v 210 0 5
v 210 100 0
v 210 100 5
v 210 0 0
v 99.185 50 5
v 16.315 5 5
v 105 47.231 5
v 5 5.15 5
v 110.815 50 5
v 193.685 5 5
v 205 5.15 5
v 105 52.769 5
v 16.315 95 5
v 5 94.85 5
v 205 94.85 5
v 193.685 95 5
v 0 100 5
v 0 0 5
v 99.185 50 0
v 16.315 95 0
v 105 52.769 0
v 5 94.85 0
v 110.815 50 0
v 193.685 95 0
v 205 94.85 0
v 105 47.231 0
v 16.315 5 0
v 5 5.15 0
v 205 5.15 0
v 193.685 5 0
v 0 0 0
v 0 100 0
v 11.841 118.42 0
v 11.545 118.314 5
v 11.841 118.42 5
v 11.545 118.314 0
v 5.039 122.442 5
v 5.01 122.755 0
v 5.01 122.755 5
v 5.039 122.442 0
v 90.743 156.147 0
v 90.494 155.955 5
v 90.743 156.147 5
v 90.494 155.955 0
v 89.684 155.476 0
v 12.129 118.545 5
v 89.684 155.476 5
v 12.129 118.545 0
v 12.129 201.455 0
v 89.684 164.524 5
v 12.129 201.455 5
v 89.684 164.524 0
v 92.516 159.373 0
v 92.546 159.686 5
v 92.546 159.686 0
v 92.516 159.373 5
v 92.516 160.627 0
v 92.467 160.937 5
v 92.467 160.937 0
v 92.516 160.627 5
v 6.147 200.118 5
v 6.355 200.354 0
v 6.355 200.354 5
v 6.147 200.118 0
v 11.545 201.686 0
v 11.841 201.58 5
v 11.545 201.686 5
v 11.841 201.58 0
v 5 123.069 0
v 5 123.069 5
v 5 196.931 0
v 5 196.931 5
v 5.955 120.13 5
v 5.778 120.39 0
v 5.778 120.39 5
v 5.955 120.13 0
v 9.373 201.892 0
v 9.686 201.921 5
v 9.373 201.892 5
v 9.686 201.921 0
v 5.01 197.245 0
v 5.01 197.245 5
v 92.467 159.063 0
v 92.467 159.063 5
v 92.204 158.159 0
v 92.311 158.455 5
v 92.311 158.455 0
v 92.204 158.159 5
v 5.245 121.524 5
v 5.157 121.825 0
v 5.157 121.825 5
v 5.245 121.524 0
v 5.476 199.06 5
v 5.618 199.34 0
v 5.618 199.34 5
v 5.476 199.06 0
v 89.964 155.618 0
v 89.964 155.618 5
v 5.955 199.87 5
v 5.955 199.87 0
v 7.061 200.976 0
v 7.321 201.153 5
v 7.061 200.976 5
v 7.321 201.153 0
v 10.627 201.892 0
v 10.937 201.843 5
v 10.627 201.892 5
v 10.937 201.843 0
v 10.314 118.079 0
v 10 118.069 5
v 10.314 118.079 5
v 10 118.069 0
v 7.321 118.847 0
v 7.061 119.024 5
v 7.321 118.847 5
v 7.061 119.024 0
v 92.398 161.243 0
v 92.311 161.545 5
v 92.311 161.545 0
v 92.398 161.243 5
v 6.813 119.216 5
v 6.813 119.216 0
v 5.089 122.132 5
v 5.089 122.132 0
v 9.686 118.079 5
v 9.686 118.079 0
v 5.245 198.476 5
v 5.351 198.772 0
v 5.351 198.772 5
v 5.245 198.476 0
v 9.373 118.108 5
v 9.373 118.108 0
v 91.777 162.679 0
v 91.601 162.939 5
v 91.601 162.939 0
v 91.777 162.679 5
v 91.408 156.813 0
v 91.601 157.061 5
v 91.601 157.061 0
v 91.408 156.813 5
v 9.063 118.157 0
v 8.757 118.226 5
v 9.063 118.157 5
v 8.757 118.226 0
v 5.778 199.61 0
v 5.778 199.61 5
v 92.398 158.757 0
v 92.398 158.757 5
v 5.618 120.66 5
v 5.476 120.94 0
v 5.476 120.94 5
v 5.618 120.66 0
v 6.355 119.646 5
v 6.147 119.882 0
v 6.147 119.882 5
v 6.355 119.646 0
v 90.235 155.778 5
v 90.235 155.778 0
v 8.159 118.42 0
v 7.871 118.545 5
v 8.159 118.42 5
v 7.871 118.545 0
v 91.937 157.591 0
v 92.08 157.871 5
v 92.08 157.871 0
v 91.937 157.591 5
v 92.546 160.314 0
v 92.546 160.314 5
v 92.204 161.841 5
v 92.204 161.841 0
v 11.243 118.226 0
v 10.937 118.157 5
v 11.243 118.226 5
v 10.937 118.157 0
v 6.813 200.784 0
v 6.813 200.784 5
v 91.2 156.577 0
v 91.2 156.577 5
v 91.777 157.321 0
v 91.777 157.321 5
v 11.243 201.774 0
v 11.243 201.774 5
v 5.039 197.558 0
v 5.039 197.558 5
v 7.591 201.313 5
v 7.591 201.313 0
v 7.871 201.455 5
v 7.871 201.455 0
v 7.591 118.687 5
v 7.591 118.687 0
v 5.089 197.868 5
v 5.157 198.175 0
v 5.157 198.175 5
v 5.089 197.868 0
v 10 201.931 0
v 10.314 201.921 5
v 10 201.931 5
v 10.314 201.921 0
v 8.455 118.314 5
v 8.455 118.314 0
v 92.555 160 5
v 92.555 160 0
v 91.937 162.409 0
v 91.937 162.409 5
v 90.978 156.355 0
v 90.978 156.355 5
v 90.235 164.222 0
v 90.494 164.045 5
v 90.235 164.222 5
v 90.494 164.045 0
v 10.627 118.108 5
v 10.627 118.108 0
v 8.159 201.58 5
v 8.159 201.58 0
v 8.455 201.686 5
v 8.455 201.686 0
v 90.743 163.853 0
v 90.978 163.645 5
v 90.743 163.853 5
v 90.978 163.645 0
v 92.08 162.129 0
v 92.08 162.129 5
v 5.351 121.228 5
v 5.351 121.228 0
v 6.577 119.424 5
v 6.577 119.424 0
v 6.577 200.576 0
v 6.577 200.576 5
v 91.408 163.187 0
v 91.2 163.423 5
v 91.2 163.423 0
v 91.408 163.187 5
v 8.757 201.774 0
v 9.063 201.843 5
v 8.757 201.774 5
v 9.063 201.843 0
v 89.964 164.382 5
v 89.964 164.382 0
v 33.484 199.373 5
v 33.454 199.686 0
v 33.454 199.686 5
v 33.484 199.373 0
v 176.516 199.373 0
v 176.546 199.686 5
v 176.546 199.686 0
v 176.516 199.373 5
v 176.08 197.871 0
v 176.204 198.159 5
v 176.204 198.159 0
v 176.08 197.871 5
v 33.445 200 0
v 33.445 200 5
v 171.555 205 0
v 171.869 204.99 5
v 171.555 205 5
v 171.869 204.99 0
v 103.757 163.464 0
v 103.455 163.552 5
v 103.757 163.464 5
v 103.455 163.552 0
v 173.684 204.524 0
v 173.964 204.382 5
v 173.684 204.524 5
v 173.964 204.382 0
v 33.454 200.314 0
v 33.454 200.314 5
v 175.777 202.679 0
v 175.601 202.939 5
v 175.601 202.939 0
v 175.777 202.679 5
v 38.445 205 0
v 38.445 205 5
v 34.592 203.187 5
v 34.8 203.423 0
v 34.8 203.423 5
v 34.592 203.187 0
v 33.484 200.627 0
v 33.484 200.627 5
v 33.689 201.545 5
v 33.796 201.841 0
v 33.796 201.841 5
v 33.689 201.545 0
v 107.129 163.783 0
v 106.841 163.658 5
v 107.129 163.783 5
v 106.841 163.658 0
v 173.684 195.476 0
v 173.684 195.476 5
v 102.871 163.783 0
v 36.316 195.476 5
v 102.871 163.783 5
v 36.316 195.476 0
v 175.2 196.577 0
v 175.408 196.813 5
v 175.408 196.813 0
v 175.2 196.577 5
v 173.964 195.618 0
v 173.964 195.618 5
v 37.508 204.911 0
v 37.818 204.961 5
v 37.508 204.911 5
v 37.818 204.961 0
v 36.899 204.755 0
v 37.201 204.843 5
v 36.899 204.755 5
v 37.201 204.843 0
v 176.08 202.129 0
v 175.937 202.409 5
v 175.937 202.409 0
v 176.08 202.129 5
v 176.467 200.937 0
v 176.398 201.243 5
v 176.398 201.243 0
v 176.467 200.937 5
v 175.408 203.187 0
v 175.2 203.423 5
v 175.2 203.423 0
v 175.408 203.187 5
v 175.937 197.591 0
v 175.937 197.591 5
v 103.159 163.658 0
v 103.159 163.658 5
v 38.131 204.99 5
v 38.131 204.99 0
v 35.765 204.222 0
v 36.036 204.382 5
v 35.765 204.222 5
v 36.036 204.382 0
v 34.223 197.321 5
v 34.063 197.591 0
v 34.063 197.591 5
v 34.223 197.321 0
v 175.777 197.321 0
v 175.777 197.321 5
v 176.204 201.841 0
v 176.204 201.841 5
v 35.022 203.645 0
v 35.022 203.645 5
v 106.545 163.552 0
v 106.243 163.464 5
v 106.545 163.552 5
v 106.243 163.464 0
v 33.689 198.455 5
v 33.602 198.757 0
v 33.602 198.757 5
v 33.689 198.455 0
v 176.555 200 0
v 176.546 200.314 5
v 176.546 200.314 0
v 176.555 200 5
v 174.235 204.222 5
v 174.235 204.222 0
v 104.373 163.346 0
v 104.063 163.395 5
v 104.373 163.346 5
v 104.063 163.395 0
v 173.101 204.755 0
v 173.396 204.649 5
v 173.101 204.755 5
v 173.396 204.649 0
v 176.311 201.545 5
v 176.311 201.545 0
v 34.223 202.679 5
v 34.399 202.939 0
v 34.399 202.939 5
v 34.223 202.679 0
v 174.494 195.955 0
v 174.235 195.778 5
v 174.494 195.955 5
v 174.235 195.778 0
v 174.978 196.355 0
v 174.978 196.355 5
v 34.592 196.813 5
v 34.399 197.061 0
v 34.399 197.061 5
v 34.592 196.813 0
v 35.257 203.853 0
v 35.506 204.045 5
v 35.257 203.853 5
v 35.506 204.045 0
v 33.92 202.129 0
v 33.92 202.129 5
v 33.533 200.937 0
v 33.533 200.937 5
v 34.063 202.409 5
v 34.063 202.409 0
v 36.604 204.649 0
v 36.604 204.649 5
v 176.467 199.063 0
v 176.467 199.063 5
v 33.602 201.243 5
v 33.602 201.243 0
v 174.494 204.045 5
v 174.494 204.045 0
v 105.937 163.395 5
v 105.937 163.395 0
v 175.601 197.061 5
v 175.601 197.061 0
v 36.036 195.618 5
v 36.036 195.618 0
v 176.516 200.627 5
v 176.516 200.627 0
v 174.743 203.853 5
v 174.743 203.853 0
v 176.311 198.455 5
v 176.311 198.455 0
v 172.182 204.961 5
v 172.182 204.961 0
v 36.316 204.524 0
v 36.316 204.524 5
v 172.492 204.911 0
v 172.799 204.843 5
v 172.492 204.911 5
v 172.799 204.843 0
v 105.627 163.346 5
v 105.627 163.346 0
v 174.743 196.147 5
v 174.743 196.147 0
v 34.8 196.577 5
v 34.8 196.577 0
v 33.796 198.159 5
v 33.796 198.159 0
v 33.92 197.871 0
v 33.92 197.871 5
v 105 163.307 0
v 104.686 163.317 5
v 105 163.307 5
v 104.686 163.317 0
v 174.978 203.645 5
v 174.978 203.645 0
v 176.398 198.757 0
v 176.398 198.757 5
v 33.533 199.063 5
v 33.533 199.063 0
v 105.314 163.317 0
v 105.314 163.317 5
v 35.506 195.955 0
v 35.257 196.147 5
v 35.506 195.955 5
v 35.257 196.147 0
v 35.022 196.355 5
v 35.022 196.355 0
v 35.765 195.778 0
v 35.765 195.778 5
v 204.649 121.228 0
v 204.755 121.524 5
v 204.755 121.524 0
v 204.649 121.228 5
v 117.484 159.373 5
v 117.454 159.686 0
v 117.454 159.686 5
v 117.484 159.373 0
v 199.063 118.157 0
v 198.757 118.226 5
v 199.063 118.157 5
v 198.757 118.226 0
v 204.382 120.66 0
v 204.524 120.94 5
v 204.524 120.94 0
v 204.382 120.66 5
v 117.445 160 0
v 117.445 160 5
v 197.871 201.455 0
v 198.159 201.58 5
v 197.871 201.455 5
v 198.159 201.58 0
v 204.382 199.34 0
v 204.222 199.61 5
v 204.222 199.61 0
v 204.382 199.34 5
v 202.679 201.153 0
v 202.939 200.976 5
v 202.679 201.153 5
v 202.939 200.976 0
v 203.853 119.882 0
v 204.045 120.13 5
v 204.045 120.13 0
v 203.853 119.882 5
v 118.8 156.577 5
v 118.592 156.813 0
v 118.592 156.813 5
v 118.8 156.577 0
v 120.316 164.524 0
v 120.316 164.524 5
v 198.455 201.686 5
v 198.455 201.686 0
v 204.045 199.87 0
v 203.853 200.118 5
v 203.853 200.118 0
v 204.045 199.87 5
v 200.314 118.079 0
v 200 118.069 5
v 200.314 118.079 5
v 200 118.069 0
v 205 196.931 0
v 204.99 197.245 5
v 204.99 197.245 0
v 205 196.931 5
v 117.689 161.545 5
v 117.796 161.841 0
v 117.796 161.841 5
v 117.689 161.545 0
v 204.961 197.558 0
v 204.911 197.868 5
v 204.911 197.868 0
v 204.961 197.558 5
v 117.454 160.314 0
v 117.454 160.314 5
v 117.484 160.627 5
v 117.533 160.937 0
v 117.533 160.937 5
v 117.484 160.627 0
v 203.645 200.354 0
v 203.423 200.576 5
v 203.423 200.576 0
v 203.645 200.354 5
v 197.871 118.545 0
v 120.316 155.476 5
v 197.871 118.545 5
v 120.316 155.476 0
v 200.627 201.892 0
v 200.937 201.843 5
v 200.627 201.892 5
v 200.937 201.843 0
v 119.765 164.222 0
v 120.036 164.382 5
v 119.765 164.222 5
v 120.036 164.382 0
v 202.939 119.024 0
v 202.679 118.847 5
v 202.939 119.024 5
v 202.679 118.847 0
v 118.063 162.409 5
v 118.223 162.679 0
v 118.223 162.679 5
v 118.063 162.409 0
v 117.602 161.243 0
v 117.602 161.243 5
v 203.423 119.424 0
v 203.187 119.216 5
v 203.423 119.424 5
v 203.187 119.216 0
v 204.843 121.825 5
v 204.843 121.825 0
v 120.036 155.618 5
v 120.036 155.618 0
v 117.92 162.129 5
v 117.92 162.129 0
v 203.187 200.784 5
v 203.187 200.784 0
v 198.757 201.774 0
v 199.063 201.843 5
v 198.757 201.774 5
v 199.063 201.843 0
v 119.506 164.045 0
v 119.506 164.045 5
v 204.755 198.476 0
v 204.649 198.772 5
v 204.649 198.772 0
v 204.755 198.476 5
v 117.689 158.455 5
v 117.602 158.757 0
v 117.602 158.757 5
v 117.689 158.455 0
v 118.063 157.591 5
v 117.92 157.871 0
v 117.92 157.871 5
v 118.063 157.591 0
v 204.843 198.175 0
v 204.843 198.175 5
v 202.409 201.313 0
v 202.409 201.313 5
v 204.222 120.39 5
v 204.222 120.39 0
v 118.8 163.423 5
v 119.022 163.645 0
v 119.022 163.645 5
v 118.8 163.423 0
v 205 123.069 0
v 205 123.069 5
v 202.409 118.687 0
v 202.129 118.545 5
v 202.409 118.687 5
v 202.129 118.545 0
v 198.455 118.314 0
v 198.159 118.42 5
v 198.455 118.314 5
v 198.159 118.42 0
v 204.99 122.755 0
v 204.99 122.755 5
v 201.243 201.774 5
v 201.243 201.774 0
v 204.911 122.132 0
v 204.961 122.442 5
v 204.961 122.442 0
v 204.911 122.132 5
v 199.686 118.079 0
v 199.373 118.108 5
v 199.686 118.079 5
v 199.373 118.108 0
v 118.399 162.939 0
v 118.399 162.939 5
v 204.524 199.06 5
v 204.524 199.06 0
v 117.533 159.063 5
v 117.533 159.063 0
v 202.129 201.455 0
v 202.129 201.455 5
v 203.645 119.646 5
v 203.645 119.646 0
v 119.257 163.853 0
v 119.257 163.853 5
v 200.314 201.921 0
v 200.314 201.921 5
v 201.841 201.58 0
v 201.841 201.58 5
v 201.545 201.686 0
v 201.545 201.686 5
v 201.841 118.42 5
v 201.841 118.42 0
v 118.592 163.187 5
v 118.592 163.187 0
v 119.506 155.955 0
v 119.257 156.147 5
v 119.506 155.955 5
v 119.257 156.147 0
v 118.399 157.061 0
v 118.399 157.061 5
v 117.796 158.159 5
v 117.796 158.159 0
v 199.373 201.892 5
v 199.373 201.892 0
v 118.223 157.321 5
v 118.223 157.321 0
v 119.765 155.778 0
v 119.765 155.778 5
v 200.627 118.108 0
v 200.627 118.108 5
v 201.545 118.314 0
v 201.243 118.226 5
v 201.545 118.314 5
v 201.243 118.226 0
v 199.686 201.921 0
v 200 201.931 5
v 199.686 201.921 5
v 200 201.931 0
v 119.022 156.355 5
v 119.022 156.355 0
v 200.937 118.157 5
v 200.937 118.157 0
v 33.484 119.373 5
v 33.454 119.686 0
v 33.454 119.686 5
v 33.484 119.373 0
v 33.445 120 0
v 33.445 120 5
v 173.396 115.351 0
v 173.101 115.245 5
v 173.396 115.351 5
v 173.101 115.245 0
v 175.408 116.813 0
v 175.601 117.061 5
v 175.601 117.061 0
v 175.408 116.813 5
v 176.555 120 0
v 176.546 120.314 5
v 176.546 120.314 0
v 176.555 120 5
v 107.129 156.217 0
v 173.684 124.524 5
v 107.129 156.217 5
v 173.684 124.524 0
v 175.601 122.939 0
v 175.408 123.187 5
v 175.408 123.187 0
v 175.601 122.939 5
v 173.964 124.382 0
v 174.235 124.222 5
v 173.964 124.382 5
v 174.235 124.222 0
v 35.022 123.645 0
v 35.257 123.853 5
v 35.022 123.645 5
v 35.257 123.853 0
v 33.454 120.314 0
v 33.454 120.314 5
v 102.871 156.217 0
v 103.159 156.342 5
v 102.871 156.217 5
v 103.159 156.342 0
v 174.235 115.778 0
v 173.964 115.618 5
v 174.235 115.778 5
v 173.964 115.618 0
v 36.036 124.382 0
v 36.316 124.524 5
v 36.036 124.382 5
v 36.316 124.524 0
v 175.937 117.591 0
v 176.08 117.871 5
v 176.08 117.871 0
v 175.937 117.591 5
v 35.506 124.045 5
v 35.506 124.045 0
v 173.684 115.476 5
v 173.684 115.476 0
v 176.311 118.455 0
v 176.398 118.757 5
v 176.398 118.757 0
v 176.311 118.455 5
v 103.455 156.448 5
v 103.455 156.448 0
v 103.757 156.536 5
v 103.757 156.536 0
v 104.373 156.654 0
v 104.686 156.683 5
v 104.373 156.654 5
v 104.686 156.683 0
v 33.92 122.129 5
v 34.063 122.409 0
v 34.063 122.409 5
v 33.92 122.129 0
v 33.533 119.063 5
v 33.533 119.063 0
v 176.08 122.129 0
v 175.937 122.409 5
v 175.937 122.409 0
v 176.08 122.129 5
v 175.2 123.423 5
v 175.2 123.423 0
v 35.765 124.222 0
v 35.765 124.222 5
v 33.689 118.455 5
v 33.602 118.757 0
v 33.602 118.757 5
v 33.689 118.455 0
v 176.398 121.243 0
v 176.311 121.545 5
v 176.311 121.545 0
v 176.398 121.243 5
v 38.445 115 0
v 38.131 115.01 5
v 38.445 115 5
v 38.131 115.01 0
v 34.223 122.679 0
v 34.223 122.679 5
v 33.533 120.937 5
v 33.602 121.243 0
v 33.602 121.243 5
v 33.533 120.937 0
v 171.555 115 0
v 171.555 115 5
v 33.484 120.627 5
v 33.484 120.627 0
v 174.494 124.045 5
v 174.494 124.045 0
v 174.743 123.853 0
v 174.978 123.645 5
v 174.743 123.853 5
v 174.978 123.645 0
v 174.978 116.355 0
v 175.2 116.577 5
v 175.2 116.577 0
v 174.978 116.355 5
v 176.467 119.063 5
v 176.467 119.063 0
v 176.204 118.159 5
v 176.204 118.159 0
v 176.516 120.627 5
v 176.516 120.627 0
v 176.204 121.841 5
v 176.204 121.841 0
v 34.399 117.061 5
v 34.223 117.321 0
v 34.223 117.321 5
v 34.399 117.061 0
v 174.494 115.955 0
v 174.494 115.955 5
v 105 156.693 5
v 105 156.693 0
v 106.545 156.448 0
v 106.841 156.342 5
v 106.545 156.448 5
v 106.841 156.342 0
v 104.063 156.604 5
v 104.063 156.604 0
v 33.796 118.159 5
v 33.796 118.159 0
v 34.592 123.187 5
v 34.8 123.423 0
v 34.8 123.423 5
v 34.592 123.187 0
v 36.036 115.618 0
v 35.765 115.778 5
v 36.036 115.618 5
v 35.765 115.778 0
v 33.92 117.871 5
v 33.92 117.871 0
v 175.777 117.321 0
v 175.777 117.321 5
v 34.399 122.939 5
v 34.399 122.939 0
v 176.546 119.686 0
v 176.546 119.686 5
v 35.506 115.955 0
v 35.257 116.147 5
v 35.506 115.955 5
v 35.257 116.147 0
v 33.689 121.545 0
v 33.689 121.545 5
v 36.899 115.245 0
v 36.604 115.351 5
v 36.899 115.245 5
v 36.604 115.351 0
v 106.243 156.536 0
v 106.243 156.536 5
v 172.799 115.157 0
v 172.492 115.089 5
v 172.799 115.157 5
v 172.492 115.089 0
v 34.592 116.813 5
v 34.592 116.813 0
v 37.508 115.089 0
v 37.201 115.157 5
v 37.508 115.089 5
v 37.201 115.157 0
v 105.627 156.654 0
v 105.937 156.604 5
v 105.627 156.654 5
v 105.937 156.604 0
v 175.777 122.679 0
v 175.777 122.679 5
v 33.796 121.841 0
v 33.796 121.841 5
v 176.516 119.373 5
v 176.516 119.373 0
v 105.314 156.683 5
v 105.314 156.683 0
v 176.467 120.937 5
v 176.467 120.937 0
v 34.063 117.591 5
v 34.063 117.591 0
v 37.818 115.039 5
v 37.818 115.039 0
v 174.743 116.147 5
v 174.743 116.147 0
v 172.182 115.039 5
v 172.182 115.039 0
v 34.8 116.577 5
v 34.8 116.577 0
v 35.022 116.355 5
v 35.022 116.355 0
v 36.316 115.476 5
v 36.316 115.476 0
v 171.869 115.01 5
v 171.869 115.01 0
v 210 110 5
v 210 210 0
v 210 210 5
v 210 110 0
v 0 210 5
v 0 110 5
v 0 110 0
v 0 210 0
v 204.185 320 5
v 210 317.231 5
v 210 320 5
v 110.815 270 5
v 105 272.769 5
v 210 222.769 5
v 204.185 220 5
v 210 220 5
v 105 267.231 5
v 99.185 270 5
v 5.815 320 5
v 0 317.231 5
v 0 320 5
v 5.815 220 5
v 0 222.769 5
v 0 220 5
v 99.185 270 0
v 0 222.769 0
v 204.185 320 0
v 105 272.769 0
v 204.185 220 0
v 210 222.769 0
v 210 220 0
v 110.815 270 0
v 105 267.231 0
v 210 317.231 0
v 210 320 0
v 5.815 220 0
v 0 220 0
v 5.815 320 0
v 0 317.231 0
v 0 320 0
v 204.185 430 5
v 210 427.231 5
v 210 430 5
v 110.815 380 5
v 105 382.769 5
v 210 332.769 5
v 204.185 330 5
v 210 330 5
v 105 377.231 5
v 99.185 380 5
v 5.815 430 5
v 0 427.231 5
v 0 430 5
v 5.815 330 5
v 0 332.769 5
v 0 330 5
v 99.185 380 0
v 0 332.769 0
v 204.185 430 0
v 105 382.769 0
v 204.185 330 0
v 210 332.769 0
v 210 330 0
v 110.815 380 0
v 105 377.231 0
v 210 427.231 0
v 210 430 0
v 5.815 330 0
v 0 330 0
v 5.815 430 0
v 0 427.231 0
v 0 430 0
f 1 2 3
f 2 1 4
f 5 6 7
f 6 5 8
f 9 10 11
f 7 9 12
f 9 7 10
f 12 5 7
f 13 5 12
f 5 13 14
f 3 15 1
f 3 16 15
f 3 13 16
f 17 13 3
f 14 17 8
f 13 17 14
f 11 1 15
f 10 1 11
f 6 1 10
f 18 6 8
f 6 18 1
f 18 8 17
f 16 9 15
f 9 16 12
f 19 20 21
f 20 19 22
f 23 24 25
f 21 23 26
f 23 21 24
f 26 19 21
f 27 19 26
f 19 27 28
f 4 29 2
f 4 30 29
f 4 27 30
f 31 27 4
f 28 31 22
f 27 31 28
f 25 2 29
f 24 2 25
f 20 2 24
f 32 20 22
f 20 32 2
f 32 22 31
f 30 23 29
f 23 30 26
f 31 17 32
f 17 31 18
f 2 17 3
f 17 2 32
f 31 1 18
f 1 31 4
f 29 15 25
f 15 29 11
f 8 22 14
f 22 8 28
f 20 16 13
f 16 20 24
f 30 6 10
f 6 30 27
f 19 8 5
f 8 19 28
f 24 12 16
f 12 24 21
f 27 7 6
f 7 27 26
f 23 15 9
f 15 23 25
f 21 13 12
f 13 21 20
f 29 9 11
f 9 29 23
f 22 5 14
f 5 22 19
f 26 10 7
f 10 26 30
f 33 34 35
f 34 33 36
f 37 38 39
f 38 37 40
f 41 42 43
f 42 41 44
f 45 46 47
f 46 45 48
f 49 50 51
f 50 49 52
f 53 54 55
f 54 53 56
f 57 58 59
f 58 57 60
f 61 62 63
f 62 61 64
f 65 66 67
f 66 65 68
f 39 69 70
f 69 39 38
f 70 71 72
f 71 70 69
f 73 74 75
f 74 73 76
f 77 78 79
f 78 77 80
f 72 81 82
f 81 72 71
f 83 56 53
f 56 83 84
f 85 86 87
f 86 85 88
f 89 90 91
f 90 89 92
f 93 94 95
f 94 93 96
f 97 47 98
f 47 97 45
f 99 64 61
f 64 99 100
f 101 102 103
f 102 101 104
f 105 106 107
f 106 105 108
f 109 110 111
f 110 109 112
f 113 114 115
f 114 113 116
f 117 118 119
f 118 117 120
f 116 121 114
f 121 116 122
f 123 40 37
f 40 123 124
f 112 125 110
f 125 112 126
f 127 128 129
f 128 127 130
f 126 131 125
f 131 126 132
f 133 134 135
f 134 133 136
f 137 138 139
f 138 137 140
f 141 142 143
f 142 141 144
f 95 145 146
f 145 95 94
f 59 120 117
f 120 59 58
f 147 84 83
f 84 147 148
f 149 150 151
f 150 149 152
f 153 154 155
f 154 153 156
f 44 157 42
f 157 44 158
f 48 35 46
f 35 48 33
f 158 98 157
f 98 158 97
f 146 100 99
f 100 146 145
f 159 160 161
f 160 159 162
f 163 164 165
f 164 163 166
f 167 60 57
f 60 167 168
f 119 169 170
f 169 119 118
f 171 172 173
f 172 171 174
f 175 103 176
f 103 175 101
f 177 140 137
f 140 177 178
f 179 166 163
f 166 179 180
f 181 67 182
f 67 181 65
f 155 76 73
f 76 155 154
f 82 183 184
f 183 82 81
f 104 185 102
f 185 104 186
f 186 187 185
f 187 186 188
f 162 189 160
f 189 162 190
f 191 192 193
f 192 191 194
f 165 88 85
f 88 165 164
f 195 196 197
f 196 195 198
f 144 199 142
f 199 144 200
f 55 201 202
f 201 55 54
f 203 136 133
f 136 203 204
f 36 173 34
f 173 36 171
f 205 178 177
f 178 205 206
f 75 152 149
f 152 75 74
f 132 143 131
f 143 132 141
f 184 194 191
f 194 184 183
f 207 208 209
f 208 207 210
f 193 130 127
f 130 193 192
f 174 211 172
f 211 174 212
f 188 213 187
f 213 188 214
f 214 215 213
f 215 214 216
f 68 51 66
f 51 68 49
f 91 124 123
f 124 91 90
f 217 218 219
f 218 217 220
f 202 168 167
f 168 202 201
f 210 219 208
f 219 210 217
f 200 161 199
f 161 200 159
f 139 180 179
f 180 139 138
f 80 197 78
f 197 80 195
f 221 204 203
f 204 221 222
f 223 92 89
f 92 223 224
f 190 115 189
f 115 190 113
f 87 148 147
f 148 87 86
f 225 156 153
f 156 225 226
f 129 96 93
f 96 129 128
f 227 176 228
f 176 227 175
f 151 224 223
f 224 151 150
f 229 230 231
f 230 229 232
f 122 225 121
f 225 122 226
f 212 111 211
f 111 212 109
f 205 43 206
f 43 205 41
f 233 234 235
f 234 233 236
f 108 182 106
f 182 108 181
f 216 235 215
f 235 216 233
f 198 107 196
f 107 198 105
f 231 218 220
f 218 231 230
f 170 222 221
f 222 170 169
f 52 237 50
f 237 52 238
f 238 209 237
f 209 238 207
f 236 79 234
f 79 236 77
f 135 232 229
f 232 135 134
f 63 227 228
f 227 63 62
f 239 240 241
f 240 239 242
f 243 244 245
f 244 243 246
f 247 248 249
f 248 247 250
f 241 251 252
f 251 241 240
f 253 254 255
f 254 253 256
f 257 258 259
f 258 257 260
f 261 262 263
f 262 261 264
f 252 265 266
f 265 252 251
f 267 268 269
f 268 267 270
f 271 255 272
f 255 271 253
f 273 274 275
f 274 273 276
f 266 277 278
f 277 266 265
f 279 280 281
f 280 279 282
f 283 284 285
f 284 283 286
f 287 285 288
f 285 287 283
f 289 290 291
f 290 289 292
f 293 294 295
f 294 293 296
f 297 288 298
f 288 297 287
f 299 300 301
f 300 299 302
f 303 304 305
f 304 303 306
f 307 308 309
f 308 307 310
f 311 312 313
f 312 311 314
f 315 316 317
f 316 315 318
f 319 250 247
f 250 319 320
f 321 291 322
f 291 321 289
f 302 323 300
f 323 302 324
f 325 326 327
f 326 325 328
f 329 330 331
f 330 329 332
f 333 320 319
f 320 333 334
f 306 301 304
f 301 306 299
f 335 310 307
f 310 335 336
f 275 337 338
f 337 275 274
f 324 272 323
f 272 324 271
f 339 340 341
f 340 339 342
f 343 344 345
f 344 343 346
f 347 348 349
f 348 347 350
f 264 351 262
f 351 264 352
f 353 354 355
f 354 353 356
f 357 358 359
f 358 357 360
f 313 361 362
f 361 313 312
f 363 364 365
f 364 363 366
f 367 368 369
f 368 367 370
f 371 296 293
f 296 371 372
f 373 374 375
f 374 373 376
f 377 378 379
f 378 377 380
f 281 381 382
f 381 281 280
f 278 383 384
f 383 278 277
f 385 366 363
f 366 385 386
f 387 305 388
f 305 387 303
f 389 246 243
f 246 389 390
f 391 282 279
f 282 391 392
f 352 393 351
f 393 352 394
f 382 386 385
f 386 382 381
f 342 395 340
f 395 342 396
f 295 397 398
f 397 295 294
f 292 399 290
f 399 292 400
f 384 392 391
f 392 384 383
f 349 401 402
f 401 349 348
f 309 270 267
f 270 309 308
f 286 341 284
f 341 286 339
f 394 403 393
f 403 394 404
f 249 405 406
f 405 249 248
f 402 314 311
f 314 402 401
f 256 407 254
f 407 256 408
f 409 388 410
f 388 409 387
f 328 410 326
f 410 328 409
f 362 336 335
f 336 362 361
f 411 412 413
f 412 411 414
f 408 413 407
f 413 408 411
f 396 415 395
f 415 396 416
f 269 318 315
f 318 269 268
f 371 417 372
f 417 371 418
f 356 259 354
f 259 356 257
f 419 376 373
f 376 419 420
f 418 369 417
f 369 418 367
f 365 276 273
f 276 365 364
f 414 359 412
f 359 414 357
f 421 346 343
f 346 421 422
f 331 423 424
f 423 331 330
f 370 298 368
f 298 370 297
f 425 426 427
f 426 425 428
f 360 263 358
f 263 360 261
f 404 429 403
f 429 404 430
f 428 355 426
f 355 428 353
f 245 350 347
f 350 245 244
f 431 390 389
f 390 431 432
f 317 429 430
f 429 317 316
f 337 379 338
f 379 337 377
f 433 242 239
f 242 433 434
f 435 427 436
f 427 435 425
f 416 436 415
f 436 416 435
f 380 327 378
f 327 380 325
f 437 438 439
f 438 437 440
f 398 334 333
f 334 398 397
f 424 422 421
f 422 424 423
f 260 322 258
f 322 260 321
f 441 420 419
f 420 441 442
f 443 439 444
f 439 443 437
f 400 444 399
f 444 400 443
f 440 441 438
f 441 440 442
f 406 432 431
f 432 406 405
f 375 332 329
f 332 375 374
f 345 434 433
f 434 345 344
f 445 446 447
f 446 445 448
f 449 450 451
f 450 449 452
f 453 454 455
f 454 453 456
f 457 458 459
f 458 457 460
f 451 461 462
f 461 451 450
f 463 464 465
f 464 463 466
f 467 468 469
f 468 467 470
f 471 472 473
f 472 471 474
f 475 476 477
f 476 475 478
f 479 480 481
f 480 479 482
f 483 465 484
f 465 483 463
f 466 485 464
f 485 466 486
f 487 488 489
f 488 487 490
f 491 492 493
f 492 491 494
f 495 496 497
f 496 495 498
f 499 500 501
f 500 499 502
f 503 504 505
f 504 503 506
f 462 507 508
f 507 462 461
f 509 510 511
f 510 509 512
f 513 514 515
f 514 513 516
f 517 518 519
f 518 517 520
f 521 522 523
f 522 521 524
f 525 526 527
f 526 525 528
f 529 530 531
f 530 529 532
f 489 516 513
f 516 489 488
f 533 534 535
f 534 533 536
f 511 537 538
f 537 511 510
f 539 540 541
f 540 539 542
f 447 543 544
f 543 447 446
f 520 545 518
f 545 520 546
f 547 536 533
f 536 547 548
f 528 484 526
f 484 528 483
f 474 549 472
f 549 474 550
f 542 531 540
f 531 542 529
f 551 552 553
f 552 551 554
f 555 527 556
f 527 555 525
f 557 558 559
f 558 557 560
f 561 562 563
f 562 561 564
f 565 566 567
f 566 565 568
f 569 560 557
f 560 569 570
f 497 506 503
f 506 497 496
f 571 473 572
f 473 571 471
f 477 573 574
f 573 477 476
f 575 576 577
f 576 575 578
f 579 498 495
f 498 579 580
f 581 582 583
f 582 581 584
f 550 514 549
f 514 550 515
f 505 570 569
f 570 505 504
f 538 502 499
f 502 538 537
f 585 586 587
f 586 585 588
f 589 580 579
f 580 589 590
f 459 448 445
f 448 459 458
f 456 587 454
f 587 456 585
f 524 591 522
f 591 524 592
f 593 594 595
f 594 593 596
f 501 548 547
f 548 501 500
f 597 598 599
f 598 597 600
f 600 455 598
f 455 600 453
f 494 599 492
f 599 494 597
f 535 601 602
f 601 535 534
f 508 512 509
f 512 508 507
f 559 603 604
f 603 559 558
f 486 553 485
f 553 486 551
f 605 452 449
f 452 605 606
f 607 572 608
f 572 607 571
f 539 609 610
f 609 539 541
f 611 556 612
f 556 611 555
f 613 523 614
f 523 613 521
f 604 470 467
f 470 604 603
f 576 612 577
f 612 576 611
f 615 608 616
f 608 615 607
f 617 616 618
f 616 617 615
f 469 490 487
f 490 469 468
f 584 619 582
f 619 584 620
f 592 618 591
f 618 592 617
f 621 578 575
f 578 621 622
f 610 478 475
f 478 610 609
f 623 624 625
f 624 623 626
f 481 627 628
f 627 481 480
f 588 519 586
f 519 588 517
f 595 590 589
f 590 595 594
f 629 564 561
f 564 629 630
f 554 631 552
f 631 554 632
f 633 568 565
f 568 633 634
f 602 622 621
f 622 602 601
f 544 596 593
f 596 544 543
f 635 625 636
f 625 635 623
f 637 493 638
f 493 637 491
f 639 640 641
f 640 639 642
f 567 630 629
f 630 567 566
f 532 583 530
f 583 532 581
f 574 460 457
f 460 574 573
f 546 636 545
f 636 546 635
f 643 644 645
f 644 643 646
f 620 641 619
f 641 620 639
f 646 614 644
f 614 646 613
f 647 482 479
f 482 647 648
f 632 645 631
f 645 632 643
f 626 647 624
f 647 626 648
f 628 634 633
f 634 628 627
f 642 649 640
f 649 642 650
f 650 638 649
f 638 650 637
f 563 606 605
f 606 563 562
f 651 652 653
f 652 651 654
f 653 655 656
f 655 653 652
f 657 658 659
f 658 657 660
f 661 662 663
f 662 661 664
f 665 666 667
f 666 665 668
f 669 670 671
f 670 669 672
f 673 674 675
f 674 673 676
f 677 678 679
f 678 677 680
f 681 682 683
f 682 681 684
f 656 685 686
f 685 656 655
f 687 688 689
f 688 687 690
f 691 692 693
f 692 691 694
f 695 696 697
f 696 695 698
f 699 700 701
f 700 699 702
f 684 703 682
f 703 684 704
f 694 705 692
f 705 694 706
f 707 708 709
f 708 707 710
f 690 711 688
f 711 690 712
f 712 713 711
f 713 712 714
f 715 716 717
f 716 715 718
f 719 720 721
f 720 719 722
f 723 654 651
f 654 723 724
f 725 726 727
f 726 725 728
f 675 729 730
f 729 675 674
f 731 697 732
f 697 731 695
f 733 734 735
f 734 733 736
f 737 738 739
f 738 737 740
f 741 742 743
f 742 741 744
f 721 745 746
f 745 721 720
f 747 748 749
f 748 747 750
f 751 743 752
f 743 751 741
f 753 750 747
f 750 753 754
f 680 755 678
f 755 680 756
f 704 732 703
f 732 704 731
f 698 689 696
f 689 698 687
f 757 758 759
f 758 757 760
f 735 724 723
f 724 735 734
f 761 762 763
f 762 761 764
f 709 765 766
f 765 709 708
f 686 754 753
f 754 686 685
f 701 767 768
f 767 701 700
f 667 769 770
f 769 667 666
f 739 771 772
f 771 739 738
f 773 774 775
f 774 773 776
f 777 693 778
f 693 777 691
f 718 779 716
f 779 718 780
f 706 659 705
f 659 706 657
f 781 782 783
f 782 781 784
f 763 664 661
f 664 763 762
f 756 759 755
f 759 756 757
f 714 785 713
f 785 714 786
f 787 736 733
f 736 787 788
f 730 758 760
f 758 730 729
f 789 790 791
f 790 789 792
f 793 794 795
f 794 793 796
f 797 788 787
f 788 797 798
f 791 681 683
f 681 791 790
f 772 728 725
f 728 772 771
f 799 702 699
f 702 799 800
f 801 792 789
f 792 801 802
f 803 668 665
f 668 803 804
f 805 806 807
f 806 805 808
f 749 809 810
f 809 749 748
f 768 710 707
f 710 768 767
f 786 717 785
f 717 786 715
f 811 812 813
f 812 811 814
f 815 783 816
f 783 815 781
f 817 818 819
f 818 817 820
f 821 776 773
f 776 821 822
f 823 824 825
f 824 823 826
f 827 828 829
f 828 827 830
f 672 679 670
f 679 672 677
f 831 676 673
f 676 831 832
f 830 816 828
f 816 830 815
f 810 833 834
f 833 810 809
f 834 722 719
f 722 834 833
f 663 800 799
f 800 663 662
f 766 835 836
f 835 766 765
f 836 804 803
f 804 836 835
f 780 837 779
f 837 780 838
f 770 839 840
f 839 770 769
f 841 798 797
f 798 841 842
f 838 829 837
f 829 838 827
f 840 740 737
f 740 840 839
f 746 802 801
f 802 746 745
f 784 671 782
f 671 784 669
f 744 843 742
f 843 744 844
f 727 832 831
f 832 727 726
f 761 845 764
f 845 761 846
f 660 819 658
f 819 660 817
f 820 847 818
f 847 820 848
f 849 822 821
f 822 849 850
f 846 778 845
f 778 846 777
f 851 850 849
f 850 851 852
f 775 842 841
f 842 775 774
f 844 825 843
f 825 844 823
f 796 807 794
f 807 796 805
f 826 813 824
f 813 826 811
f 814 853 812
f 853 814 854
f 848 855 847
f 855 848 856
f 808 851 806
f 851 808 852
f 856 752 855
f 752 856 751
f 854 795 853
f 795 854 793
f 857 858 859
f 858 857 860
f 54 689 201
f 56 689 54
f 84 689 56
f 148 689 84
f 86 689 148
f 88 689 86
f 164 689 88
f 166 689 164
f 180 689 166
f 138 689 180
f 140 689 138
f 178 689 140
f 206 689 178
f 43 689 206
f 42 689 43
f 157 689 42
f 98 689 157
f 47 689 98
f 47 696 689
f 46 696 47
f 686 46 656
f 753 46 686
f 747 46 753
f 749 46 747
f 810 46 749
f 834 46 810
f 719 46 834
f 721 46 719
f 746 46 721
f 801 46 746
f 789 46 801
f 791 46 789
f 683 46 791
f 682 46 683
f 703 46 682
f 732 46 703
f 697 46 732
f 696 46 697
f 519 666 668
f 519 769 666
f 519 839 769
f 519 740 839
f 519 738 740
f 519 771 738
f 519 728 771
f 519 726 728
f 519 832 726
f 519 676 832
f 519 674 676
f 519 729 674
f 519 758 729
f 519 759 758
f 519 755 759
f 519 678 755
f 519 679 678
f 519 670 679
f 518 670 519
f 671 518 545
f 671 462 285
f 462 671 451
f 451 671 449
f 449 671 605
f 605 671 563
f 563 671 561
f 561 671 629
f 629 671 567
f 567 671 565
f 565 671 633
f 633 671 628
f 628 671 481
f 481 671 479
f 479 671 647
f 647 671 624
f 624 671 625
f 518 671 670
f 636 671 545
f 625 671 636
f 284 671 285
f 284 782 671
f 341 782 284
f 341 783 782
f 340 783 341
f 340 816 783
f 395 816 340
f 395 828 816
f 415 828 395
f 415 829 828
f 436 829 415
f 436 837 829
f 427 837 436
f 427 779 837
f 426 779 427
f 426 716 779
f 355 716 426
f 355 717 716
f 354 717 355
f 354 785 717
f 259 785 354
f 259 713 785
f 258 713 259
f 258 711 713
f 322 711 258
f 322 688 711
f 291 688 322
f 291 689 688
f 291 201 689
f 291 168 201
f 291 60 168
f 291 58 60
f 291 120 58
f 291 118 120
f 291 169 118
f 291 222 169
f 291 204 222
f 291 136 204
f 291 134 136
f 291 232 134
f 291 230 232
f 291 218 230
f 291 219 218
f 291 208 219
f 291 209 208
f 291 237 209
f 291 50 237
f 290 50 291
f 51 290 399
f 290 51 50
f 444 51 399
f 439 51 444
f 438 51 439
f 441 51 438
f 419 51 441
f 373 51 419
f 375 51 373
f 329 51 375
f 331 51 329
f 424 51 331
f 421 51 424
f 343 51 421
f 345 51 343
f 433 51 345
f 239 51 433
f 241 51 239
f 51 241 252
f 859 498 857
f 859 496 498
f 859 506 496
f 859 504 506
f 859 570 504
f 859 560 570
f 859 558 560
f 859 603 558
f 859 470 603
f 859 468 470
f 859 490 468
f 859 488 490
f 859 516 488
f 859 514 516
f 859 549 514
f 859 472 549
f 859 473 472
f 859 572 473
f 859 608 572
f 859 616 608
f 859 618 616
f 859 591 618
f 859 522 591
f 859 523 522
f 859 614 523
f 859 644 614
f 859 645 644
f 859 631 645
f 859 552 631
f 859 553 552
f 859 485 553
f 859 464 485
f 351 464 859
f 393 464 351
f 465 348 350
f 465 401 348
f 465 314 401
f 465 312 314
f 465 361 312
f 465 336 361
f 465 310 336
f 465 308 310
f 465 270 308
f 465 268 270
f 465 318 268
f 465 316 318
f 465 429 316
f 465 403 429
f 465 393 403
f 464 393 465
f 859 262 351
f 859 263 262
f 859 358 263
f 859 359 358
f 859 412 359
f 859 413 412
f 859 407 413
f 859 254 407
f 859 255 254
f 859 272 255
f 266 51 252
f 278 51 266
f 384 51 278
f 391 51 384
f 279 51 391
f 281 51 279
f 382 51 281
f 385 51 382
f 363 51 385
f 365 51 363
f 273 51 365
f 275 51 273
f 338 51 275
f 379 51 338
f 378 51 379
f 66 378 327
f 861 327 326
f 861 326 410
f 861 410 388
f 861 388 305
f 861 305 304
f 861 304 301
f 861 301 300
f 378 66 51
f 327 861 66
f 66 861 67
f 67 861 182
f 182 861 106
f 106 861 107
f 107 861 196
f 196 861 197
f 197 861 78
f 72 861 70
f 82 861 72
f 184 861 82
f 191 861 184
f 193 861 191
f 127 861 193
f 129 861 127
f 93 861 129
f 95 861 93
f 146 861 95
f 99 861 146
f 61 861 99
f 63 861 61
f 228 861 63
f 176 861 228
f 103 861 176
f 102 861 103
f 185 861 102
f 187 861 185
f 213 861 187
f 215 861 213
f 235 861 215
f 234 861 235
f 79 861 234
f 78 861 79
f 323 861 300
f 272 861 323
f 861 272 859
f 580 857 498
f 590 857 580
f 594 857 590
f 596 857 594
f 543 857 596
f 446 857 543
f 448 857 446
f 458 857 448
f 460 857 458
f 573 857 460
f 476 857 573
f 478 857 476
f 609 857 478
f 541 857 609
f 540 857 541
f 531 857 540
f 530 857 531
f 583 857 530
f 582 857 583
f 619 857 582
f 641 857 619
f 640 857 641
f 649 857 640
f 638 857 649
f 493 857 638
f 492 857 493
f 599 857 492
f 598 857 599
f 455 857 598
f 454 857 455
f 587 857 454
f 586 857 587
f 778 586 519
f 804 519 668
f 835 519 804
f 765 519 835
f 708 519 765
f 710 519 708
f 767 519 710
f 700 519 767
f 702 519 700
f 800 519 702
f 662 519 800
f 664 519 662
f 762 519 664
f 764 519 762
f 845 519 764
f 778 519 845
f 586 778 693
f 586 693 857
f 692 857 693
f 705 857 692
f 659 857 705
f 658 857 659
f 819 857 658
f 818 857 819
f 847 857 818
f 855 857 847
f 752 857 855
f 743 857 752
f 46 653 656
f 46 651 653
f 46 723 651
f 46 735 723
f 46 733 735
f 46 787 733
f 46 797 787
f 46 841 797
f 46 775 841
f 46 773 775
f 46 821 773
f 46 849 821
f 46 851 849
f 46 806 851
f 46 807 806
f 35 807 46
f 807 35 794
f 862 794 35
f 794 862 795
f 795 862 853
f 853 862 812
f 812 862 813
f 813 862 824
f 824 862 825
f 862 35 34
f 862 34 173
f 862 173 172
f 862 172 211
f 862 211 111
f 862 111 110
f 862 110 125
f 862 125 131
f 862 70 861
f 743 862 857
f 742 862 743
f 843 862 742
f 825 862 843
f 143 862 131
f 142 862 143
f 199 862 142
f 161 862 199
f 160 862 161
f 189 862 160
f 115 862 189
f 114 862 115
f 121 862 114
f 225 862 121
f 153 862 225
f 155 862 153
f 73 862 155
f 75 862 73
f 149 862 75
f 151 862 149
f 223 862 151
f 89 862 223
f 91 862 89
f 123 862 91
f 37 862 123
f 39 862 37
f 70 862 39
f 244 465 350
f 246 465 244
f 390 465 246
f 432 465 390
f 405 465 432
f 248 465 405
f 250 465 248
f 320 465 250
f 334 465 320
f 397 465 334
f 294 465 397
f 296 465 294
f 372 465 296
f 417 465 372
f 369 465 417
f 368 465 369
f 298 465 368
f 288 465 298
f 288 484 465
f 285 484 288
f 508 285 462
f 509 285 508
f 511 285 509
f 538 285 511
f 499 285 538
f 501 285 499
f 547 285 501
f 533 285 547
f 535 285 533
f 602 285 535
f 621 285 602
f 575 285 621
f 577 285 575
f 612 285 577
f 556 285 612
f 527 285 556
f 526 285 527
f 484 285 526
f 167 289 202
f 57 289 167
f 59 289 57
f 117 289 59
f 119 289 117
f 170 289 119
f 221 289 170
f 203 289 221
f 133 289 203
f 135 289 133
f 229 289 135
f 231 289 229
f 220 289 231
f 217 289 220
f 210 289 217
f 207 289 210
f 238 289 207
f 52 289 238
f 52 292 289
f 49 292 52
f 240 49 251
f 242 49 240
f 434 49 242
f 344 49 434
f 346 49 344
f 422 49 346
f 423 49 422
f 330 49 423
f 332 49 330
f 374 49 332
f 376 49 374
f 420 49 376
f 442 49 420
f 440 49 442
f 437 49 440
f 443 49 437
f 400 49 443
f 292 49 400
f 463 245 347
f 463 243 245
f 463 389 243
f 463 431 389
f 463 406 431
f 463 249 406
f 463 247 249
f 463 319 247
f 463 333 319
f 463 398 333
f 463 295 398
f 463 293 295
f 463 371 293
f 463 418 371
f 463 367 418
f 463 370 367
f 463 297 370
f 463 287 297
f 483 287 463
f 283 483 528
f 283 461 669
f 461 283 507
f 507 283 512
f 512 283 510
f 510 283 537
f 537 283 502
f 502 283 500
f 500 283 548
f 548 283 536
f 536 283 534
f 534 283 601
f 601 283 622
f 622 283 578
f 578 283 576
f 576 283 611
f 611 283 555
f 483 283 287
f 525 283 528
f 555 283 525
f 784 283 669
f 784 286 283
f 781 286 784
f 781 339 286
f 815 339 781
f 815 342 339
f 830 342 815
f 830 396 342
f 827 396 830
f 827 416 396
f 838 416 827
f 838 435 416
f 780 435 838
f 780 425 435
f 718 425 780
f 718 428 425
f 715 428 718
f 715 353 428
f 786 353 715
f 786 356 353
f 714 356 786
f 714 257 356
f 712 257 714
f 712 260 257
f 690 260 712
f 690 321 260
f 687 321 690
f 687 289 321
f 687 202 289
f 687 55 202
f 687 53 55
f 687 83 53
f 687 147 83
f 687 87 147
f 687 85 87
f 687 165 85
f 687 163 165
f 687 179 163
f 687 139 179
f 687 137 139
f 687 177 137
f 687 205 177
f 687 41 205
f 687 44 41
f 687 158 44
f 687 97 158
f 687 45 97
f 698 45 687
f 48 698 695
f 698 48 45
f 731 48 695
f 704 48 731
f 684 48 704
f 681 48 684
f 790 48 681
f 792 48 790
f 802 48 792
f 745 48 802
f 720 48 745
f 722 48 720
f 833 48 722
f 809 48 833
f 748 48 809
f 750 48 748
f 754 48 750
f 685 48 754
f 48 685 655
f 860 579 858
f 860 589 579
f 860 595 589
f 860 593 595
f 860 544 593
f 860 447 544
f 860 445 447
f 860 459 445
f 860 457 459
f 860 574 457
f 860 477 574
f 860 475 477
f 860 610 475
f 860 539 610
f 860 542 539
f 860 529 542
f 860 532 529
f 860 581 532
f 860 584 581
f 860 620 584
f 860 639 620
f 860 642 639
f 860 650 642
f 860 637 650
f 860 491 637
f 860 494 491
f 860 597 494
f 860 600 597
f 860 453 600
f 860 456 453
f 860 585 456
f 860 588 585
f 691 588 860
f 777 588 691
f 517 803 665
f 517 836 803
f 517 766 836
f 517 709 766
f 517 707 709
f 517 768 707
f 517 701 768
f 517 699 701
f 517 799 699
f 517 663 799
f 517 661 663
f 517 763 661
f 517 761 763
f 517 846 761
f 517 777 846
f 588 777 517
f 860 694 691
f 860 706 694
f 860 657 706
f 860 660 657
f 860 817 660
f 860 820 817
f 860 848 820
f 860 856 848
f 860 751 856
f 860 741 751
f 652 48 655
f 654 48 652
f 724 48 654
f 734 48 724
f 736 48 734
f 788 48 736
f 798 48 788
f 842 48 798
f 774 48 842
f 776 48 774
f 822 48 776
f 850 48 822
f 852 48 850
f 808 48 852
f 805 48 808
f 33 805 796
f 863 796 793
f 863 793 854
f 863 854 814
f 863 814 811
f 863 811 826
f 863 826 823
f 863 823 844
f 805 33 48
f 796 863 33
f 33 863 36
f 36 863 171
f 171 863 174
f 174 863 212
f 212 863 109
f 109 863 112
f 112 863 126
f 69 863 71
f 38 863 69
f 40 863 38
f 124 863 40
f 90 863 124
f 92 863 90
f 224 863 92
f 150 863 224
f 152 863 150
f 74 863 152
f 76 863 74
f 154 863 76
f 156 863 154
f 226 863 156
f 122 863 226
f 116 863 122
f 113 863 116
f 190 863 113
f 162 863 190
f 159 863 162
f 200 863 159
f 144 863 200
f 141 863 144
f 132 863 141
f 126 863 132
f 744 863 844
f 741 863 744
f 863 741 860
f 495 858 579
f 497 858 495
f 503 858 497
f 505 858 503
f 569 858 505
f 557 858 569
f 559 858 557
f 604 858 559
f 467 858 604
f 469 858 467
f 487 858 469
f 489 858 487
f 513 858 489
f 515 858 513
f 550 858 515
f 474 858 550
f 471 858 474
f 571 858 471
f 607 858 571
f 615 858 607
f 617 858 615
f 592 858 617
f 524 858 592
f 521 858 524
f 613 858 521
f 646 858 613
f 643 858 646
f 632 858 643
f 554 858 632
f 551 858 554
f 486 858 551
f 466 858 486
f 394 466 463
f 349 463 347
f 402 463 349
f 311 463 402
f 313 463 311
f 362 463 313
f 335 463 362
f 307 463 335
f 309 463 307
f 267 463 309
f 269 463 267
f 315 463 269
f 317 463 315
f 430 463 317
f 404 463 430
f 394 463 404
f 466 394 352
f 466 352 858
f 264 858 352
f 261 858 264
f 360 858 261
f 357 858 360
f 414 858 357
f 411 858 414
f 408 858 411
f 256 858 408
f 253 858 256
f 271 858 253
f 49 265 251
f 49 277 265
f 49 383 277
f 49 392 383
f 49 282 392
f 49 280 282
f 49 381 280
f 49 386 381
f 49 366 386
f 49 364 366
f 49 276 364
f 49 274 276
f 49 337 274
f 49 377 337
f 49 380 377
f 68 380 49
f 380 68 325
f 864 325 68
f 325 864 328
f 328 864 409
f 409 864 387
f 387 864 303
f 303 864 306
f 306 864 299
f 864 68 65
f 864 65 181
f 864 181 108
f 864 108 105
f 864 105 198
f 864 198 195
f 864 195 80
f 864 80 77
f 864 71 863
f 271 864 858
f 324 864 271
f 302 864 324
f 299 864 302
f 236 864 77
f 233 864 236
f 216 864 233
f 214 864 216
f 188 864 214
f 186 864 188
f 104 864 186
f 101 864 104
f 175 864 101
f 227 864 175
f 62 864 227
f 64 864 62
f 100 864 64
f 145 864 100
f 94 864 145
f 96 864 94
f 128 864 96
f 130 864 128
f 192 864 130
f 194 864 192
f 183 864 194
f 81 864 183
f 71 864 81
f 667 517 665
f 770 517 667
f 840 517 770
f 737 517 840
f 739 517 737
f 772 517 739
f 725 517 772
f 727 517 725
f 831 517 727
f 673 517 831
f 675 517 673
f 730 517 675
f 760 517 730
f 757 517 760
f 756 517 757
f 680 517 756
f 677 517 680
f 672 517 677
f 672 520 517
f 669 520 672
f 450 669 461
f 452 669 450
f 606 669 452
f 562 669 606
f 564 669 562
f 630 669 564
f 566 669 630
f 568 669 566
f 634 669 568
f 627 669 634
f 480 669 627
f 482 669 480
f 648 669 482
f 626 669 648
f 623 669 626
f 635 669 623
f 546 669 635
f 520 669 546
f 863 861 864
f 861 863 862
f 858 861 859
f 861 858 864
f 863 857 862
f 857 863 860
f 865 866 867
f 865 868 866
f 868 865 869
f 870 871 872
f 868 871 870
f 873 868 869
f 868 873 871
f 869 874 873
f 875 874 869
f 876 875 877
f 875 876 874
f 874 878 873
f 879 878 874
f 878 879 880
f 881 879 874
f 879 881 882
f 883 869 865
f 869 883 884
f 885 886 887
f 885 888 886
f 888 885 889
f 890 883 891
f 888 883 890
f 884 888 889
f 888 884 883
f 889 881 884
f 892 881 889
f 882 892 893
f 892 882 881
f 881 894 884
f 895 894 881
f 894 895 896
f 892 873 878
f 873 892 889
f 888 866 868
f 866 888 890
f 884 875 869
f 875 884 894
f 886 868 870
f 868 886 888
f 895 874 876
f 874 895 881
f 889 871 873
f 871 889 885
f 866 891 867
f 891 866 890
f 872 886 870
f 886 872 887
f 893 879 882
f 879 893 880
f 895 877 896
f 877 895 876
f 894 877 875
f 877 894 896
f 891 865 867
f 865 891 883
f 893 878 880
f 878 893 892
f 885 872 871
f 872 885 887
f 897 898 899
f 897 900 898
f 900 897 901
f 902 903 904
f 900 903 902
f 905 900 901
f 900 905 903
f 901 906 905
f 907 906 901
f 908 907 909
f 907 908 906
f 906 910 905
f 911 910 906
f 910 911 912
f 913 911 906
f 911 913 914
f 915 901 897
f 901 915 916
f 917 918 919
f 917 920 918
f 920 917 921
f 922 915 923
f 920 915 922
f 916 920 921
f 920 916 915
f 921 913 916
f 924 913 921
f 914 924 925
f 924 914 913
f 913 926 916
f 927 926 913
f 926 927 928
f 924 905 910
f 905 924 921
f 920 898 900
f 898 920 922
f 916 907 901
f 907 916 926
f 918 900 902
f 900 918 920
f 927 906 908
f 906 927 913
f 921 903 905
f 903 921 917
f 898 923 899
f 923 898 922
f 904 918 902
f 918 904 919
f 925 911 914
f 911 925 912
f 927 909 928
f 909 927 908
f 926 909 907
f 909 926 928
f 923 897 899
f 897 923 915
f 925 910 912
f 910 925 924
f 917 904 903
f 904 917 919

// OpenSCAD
/*
    make reinforcement axis in a open frame.
*/

d=[210,100,5];
width = 5;
t=[0, d.y + 10, 0];

// standaard, geen afroding
translate(t * 0) reinforceX(d=d, width=width);
// afronding
translate(t * 1) reinforceX(d=d, width=width, radius = 5);
// xOnly, geen afronding
translate(t * 2) reinforceX(d=d, width=width, xOnly=true);
// xOnly, afronding (doet het nog niet)
translate(t * 3) reinforceX(d=d, width=width, xOnly=true, radius = 5);


module reinforceX(d =[200, 100, 5], width=2, xOnly=false, radius = 0) {
    if (radius <= 0) {
        __X(d=d, width=width, xOnly =  xOnly);
    } else if (xOnly) {
        // TODO hier moet nog een oplossing voor worden verzonnen
        __X(d=d, width=width, xOnly =  xOnly);
    } else {
        __cutOut(d=d, width=width, xOnly =  xOnly, radius=radius);
    }

}

module __X(d =[200, 100, 5], width=2, xOnly=false) {

    if (!xOnly)
    difference() {
        cube(d);
        translate([width, width, -d.z / 2])
        cube ([d.x - width * 2, d.y - width * 2, d.z * 2]);
    }
    __balk(d, width);
}

module __balk(d =[200, 100, 2], width = 2) {
    hoek=atan(d.y / d.x);
    l = sqrt(d.x*d.x + d.y*d.y);

    difference() {
        union() {
            rotate([0, 0, hoek])
            translate([0, -width / 2, 0])
            cube([l, width ,d.z]);
            
            translate([0, d.y, 0])
            rotate([0, 0, -hoek])
            translate([0, -width / 2, 0])
            cube([l, width ,d.z]);
        }
        difference() {
            translate(-d/2)
            cube(d*2);
            cube(d);
        }
    }
}
    


module __cutOut(d =[200, 100, 2], width=2, radius = 2, xOnly = false) {
    
    /*
        x
     ====>
    ||
    || y
    \/ 
    
    
     0   ------------------- 3          H0 = atan (d.x / d.y)
        |\H2            H2/|            H1 = 180 - 2 * Hoek 1    
        | \              / |            H2 = atan (d.y / d.x)
        |H0\            /  |            h3 = 180 - 2 * Hoek 3
        |   \    D3    /   |
        |    \        /    |   
        |     \      /     |   
        |      \    /      |   
        |       \ 3/       |   
        |  D0  H1\/H1  D2  |   
        |        /\        |   
        |       /H3\       |
        |      /    \      |
        |     /      \     |
        |    /        \    |
        |   /   D0     \   |
        |H0/            \H0|
        | /              \ |
        |/H2            H2\|
     1  |------------------|  2
    
        
      H0   
        |\
        | \         Aangeven van de hoekenpinten: D1H1 etc 
        |  \ 
        |   \    
        |    \   
        |     \ 
        |      \ 
        |       \ 
        |  D?    \  H2
        |        /
        |       /
        |      /
        |     / 
        |    /  
        |   /   
        |  /    
        | /     
        |/     
    H1 |
    
        
    
    
    
    */


    // de hoeken
    H = [atan(d.x / d.y)
       , 180 - 2 * atan(d.x / d.y)
       , atan(d.y / d.x)
       , 180 - 2 * atan(d.y / d.x)];
    
    // de deltas per hoek
    dd = [ [width                    , deltaBuiten(width, H[0])]
         , [deltaBinnen(width, H[1]) , 0                          ]
         , [deltaBuiten(width, H[2]) , width                      ]
         , [0                        , deltaBinnen(width, H[3])]];
    
    
    // de punten
    D  = [  [[0  , 0  ], [0  , d.y], [d.x, d.y]/2 ]
          , [[0  , d.y], [d.x, d.y], [d.x, d.y]/2 ]
          , [[d.x, d.y], [d.x, 0  ], [d.x, d.y]/2 ]
          , [[d.x, 0  ], [0  , 0  ], [d.x, d.y]/2 ]];
          
    // de delta's
    DD = [  [[ dd[0].x,  dd[0].y], [ dd[0].x, -dd[0].y], [-dd[1].x, -dd[1].y]]
          , [[ dd[2].x, -dd[2].y], [-dd[2].x, -dd[2].y], [ dd[3].x,  dd[3].y]]
          , [[-dd[0].x, -dd[0].y], [-dd[0].x,  dd[0].y], [ dd[1].x,  dd[1].y]]
          , [[-dd[2].x,  dd[2].y], [ dd[2].x,  dd[2].y], [-dd[3].x, -dd[3].y]]];
    

    // hulpvariabelen voor het bepalen van middelpunt van de cirkel.
    // l = lengten van hoekpunt naar brandpunt van cirkel
    l = [radius / sin(H[0] / 2)
       , radius / sin(H[1] / 2)
       , radius / sin(H[2] / 2)
       , radius / sin(H[3] / 2)];
    
    r =  [[l[0] * sin(H[0] / 2), l[0] * cos(H[0] / 2)] 
        , [l[2] * cos(H[2] / 2), l[2] * sin(H[2] / 2)]];
    
    // de deltas voor de afronding per driehoek 
    R = [[[ r[0].x,  r[0].y], [ r[0].x, -r[0].y], [-l[1],  0   ]]
       , [[ r[1].x, -r[1].y], [-r[1].x, -r[1].y], [ 0   ,  l[3]]]
       , [[-r[0].x, -r[0].y], [-r[0].x,  r[0].y], [ l[1],  0   ]]
       , [[-r[1].x,  r[1].y], [ r[1].x,  r[1].y], [ 0   , -l[3]]]];
         
//    for(i=[0:3]) {
//        for(j=[0:2]) {
//            color("red") inspectPoint(D[i][j], heightObject = d.z);
//            color("green") inspectPoint(D[i][j] + DD[i][j], , heightObject = d.z);
//            color("blue") inspectPoint(D[i][j] + DD[i][j] + R[i][j], radius, , heightObject = d.z);
//        }
//    }
    
    
    difference() {
        cube(d);
        for(i=[0:3]) {
            translate([0, 0, -d.z / 2])
            linear_extrude(height = d.z * 2) {
                hull()  {
                    for(j=[0:2]) {
                        pos = D[i][j] + DD[i][j] + R[i][j];
                        translate([pos.x, pos.y, 0])
                        circle(d = radius * 2, center=true, $fn=100);
                    }
                }
            }
        }
    }
 
    echo(width=width);
    echo(d=d);
    echo(radius=radius);
    echo(H=H);
    echo(dd=dd);
    echo(D=D);
    echo(DD=DD);
    echo(l=l);
    echo(r=r);
    echo(R=R);
    
    
    

}


module inspectPoint(point, radius = 0.1, heightObject = 5) {
    l=heightObject * 3;
    
    translate([point.x, point.y, -heightObject])
    linear_extrude(height=l)
    circle(d=radius*2, true, $fn=100);
}


function deltaBuiten(width = 2, hoek = 90) = 
    (width / 2) * ((2 * cos(hoek) + 1) / sin(hoek));
function deltaBinnen(width = 2, hoek = 90) = 
    (width / sin(hoek)) * cos(hoek / 2);
